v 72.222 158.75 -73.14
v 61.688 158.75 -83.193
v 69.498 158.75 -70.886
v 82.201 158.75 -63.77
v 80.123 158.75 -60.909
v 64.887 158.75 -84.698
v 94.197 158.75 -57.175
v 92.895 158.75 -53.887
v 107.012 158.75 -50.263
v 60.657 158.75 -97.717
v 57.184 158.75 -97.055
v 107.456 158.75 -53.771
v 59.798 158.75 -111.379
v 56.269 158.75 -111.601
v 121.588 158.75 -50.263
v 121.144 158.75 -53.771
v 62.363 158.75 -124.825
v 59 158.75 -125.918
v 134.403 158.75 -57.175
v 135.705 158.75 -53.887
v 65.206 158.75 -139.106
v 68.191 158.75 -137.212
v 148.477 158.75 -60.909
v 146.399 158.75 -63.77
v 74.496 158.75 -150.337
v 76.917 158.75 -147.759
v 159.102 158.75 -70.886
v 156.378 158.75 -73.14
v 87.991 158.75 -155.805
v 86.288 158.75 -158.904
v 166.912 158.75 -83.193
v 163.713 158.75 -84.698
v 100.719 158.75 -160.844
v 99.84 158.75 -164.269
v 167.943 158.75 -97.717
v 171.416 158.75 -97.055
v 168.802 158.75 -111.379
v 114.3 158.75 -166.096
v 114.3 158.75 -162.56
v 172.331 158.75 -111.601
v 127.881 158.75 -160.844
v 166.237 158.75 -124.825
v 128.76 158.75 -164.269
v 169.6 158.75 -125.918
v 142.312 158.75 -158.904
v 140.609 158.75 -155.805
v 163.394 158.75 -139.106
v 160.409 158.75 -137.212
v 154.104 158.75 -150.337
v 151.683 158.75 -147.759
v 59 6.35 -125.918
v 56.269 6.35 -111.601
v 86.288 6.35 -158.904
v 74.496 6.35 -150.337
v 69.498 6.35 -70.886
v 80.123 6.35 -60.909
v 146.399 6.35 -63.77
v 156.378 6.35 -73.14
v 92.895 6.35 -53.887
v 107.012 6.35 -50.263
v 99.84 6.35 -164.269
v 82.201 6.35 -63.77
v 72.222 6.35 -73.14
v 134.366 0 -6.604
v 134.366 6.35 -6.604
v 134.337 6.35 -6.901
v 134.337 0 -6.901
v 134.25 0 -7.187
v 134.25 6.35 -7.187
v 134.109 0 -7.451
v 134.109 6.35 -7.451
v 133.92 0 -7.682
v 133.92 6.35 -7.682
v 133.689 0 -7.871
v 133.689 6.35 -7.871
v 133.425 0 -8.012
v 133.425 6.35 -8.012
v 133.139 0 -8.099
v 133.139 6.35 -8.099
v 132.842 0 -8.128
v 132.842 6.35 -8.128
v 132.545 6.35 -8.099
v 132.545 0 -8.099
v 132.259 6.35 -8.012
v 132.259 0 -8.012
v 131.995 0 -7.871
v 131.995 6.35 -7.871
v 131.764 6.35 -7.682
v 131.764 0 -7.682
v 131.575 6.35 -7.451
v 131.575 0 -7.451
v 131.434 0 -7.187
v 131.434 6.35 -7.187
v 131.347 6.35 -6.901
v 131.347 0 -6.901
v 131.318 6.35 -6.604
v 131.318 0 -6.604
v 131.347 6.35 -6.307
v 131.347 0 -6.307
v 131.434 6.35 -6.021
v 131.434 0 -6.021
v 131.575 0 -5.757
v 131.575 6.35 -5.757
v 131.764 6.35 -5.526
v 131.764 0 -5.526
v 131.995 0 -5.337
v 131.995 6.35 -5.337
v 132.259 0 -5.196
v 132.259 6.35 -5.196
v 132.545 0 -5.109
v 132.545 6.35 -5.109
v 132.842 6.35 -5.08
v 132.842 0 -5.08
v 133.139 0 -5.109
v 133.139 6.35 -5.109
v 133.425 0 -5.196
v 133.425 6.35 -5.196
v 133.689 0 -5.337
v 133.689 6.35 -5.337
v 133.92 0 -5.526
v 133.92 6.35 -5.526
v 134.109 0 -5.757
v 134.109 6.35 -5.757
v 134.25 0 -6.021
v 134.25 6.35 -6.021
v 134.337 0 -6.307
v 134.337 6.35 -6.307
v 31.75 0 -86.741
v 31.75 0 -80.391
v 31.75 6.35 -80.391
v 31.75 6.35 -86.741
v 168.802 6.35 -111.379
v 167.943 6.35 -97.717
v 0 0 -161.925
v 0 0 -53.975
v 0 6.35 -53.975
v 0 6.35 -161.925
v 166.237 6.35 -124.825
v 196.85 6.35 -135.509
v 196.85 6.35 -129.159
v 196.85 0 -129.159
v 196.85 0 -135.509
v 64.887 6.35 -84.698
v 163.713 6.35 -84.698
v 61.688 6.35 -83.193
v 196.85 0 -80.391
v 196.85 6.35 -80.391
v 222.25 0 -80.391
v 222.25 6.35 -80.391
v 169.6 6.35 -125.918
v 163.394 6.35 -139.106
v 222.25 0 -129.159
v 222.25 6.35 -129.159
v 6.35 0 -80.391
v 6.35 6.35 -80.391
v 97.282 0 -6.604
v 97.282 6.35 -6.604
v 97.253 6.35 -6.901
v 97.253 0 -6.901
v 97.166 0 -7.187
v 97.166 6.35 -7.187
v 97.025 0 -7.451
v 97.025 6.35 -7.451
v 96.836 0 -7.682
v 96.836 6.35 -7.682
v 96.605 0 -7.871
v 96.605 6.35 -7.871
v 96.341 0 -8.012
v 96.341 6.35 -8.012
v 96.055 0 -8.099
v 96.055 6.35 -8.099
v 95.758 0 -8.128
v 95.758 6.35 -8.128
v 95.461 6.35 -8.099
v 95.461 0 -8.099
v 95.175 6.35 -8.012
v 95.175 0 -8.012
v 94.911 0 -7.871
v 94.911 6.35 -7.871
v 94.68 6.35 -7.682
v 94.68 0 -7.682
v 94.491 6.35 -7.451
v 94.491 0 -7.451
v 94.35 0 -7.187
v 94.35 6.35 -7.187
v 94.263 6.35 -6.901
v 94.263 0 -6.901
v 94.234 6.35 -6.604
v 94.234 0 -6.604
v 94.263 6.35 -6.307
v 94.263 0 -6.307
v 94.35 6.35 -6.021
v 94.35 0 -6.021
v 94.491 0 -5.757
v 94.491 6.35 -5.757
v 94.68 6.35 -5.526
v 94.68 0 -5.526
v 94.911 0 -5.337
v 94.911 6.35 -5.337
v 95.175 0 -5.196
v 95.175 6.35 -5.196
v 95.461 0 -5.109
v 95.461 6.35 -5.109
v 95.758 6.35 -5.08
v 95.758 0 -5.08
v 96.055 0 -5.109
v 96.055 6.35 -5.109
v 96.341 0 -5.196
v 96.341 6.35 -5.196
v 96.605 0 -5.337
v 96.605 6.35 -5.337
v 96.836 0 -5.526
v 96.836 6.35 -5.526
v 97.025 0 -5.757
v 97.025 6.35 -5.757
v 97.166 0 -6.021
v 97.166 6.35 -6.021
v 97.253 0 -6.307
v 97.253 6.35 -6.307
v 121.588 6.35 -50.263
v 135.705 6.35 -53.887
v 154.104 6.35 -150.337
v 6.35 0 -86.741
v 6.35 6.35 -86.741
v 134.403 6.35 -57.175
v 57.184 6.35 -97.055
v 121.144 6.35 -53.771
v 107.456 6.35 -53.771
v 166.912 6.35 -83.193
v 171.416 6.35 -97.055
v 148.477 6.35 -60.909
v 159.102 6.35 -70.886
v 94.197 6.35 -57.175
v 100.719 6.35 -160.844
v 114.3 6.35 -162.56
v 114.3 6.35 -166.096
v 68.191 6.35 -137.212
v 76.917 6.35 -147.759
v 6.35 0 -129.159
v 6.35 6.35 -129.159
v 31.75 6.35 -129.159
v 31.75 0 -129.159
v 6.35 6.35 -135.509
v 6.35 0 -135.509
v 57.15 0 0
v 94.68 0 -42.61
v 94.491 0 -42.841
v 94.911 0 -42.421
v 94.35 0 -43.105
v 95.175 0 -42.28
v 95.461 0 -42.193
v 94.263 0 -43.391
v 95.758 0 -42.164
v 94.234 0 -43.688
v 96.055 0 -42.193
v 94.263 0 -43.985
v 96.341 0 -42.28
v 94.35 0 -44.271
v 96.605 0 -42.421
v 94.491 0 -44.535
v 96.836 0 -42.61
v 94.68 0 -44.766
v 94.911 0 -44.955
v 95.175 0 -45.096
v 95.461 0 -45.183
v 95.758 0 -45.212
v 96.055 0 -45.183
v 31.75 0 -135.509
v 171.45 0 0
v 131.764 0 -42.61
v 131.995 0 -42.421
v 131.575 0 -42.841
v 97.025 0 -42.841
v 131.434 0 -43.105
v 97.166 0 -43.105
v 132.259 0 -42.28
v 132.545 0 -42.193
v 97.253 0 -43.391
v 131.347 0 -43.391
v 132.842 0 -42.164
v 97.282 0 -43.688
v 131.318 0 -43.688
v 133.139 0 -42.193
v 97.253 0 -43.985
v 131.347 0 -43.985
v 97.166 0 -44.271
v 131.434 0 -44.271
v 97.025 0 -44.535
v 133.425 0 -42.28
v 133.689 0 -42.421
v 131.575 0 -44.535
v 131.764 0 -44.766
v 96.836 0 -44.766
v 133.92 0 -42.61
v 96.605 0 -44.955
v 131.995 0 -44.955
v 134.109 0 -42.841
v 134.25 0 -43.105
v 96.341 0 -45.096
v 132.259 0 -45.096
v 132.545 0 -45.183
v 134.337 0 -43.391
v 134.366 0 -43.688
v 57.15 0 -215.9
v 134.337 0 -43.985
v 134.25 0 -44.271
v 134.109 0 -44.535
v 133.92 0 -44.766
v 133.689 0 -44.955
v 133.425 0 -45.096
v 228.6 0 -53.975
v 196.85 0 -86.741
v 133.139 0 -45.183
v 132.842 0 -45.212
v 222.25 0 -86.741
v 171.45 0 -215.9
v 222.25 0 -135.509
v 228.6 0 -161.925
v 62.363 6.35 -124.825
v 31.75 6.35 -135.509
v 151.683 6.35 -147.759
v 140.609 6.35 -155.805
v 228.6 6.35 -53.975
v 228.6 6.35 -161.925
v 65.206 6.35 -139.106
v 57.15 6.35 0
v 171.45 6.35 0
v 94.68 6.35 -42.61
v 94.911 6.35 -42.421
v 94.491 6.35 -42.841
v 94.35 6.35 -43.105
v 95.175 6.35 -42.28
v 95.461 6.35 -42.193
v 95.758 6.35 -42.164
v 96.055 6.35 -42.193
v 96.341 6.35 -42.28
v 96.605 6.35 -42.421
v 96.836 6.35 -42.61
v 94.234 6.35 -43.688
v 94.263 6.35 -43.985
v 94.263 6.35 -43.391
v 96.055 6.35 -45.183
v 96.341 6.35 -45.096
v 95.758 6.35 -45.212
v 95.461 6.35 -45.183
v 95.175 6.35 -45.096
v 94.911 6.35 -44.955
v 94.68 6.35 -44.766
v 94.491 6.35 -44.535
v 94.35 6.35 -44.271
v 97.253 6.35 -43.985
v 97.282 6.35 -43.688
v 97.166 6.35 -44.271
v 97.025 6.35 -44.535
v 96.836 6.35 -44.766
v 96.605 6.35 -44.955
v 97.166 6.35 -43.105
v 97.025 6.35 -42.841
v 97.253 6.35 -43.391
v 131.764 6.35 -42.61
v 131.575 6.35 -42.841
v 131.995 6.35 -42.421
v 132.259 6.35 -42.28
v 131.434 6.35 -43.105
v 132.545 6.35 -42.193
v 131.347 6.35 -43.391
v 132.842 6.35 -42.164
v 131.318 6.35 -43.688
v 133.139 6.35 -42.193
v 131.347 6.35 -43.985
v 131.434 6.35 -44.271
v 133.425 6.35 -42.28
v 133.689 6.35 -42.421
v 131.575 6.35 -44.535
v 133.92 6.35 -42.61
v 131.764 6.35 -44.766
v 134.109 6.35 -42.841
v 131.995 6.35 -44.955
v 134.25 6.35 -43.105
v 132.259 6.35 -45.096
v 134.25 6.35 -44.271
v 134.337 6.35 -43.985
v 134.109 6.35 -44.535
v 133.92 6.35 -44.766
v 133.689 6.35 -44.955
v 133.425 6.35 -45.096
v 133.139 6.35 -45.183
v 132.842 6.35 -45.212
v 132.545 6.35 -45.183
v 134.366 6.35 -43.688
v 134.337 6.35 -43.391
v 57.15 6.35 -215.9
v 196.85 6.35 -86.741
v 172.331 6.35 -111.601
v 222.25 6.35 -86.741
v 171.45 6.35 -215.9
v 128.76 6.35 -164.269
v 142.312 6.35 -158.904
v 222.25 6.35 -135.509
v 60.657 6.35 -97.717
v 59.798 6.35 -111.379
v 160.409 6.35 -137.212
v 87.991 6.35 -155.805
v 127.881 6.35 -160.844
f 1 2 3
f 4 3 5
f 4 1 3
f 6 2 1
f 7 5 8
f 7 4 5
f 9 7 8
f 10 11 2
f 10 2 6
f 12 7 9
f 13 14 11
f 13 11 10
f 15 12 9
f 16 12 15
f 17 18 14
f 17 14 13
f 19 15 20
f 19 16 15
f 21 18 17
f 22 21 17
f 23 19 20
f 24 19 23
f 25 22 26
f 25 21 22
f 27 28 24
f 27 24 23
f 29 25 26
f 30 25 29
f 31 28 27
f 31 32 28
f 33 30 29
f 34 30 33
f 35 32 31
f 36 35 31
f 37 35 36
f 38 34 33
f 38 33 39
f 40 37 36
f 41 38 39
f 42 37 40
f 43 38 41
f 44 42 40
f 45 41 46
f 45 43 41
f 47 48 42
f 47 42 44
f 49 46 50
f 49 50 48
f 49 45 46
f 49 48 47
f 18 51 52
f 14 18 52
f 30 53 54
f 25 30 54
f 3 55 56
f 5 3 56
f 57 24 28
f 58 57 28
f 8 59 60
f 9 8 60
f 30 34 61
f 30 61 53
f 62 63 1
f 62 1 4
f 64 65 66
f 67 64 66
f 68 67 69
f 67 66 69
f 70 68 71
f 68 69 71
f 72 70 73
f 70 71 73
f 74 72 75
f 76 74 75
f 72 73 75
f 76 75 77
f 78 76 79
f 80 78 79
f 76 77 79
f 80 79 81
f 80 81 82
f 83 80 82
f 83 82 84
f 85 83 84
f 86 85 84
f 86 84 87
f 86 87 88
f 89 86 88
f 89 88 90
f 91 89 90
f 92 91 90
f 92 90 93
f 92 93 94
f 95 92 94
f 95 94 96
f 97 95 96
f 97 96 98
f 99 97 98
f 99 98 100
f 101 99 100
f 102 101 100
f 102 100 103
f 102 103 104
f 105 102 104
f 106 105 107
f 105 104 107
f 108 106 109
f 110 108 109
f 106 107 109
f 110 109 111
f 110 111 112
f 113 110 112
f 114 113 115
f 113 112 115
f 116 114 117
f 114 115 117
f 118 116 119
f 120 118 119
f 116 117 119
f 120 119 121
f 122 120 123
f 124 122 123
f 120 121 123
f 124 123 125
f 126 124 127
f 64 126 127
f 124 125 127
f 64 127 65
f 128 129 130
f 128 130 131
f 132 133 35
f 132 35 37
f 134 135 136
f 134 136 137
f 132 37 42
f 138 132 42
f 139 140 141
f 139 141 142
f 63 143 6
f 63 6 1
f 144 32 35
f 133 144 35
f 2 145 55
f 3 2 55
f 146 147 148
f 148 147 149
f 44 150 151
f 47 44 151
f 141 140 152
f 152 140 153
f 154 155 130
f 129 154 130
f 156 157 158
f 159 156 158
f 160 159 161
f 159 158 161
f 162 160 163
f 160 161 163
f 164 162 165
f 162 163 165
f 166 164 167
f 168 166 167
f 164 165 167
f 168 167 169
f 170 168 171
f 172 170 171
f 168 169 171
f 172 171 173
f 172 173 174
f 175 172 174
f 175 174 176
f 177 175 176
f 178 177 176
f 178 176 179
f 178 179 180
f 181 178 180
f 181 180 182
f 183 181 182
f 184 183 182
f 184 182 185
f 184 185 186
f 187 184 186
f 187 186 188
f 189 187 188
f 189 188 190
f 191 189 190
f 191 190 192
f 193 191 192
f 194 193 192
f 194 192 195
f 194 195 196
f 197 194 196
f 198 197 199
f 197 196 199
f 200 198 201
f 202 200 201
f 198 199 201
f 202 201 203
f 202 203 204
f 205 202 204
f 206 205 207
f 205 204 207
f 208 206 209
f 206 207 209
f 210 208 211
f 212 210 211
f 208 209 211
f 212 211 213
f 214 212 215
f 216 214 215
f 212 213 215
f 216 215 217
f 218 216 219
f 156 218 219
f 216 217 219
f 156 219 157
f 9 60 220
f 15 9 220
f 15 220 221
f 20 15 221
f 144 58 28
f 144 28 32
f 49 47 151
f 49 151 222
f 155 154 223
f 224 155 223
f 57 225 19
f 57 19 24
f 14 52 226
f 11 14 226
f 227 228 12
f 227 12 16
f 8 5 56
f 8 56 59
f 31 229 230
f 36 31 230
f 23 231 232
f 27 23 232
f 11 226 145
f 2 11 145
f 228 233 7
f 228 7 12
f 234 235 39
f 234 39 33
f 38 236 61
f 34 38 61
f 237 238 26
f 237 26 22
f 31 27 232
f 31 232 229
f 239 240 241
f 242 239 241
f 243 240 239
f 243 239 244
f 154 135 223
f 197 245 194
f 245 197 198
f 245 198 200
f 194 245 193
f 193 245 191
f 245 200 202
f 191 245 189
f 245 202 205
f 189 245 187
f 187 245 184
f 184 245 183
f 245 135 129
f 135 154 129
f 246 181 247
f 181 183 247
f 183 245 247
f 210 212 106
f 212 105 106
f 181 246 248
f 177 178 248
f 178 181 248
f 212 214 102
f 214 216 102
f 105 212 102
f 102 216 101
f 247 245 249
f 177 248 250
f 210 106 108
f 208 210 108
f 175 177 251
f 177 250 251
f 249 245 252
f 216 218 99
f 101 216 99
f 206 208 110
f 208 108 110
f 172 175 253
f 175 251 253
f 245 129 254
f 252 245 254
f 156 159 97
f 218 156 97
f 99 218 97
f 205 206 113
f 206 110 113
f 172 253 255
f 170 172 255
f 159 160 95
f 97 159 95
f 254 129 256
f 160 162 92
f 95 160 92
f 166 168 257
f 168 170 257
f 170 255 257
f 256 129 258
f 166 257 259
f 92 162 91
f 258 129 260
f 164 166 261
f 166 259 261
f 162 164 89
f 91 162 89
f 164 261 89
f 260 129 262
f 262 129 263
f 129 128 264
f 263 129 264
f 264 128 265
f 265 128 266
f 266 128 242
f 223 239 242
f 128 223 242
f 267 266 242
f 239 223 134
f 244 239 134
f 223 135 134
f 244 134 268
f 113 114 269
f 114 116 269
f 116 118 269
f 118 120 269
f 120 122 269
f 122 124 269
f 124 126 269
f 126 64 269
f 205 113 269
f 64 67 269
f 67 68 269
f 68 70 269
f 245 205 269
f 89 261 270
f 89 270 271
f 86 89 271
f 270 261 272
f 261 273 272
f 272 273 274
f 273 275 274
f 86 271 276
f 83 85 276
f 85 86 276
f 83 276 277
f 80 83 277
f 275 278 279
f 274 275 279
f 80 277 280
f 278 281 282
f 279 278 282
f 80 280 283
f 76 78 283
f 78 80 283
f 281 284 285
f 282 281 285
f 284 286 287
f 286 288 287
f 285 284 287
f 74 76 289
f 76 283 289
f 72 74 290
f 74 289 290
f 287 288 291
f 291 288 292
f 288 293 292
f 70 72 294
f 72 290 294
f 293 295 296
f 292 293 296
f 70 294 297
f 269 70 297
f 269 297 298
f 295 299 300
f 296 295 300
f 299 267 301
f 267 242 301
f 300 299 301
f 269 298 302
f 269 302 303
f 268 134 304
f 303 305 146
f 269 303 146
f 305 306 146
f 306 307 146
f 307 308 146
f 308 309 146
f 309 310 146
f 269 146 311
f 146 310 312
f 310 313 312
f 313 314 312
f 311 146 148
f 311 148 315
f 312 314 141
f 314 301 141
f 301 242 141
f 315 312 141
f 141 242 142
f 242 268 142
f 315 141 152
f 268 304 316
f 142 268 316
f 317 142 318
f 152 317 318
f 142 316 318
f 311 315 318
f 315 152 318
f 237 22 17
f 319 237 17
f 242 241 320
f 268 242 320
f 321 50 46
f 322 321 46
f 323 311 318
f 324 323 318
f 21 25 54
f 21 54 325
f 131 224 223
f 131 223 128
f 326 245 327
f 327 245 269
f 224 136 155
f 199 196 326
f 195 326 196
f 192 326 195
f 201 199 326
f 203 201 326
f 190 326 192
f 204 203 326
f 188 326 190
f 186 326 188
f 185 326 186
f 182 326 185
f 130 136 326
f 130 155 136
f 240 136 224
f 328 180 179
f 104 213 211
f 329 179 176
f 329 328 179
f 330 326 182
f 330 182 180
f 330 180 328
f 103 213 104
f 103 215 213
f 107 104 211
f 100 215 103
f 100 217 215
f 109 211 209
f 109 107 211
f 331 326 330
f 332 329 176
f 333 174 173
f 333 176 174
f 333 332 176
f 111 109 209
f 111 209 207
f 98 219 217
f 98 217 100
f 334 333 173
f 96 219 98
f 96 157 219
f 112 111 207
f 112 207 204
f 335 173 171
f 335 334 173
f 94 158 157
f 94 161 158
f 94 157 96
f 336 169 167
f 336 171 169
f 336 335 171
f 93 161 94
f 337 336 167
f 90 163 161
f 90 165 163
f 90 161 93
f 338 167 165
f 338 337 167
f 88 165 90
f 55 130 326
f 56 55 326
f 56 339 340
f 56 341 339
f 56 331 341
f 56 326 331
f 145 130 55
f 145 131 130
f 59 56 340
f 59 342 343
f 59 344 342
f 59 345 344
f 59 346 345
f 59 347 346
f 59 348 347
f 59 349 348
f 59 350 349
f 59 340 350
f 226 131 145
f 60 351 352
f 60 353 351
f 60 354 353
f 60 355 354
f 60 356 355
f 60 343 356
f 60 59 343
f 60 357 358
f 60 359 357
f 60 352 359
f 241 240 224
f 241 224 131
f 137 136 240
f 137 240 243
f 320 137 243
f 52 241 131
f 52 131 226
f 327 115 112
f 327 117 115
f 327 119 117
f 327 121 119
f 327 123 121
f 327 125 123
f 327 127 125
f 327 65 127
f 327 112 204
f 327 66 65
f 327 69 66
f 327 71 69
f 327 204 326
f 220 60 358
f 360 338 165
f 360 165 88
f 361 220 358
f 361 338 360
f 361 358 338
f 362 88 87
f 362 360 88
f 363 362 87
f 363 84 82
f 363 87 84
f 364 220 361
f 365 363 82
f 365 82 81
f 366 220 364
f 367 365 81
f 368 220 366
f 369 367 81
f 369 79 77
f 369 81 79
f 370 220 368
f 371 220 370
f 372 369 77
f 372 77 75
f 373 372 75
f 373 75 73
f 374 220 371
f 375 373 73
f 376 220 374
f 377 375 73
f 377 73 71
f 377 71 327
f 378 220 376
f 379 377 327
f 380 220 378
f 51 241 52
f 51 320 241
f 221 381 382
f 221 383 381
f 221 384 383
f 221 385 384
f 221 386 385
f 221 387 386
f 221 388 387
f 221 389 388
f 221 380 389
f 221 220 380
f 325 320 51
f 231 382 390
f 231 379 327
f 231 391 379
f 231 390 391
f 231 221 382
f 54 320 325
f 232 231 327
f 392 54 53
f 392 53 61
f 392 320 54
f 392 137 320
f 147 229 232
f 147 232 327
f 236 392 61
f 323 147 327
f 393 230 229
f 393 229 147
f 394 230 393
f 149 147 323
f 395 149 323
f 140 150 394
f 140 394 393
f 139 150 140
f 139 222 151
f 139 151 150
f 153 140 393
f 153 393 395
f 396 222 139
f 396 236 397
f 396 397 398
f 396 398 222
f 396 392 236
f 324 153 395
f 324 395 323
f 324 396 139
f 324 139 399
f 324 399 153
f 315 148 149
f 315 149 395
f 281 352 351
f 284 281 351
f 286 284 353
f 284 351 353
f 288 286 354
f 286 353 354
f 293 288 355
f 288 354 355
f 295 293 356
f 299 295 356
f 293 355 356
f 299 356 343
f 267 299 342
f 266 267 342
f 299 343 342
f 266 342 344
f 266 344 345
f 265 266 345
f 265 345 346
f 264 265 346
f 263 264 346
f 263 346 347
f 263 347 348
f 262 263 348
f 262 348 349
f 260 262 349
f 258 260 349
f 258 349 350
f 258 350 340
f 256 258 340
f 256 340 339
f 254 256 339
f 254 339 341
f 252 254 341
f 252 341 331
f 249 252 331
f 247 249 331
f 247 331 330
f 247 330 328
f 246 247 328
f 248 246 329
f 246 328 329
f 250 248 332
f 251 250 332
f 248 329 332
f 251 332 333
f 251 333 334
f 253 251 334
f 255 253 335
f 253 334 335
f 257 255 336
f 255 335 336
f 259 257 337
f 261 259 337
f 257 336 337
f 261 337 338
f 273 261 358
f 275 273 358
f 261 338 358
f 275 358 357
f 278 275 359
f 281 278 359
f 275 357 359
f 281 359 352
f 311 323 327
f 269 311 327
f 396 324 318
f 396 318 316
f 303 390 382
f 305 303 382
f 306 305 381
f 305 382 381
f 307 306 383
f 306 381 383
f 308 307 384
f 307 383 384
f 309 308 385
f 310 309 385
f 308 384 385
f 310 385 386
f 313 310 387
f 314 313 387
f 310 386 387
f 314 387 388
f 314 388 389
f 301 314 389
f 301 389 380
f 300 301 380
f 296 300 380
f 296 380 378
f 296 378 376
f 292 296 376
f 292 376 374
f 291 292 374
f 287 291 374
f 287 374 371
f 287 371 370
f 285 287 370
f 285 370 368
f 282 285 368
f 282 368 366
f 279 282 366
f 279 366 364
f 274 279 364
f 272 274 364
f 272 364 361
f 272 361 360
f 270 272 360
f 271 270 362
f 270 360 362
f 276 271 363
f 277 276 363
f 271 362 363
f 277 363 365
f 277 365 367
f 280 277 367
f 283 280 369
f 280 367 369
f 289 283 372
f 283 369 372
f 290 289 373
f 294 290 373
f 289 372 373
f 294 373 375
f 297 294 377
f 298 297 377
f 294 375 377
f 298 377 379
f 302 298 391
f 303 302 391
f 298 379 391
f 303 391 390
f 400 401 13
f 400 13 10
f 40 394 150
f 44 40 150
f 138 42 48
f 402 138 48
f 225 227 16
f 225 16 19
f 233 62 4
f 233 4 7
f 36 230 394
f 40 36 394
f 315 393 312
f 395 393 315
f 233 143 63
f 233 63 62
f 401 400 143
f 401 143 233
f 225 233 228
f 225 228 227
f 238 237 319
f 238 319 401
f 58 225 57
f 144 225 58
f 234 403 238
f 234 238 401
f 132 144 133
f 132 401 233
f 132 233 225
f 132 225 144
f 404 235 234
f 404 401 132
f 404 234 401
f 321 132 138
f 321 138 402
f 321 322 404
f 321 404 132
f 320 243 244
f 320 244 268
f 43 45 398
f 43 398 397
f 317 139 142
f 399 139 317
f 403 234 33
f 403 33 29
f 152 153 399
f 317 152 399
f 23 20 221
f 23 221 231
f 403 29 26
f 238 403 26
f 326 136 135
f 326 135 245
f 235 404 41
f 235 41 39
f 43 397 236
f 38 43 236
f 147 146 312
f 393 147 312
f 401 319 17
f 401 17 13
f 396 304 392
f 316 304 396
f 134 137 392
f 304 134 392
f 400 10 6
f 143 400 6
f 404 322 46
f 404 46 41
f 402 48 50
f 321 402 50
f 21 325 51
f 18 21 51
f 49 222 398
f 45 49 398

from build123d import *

# Parameters (mm, degrees)
SKETCH1_W           = 228.6
SKETCH1_H           = 215.9
BOSS_EXTRUDE1_DEPTH = 6.35
SKETCH8_W           = 25.4
SKETCH8_H           = 6.35
CUT_EXTRUDE2_DEPTH  = 7.35
SKETCH11_R          = 1.524
CUT_EXTRUDE4_DEPTH  = 7.35
CUT_EXTRUDE5_DEPTH  = 7.35
BOSS_EXTRUDE3_DEPTH = 152.4


with BuildPart() as part:
    # Sketch1 → Boss-Extrude1 (new body)
    with BuildSketch(Plane(origin=(0, 0, 0), x_dir=(1, 0, 0), z_dir=(0, 1, 0))):
        with Locations((114.3, 107.95)):
            Rectangle(SKETCH1_W, SKETCH1_H)
    extrude(amount=BOSS_EXTRUDE1_DEPTH)

    # Sketch8 → Cut-Extrude2 (cut, through all)
    with BuildSketch(Plane(origin=(0, 6.35, 0), x_dir=(1, 0, 0), z_dir=(0, 1, 0))):
        with Locations((19.05, 132.334)):
            Rectangle(SKETCH8_W, SKETCH8_H)
        with Locations((209.55, 132.334)):
            Rectangle(SKETCH8_W, SKETCH8_H)
        with Locations((209.55, 83.566)):
            Rectangle(SKETCH8_W, SKETCH8_H)
        with Locations((19.05, 83.566)):
            Rectangle(SKETCH8_W, SKETCH8_H)
    extrude(amount=-CUT_EXTRUDE2_DEPTH, mode=Mode.SUBTRACT)

    # Sketch11 → Cut-Extrude4 (cut, through all)
    with BuildSketch(Plane(origin=(0, 6.35, 0), x_dir=(1, 0, 0), z_dir=(0, 1, 0))):
        with Locations((95.758, 6.604)):
            Circle(SKETCH11_R)
        with Locations((132.842, 6.604)):
            Circle(SKETCH11_R)
        with Locations((132.842, 43.688)):
            Circle(SKETCH11_R)
        with Locations((95.758, 43.688)):
            Circle(SKETCH11_R)
    extrude(amount=-CUT_EXTRUDE4_DEPTH, mode=Mode.SUBTRACT)

    # Sketch13 → Cut-Extrude5 (cut, through all)
    with BuildSketch(Plane(origin=(0, 6.35, 0), x_dir=(1, 0, 0), z_dir=(0, 1, 0))):
        Polygon((0, 215.9), (0, 161.925), (57.15, 215.9), align=None)
        Polygon((228.6, 161.925), (171.45, 215.9), (228.6, 215.9), align=None)
        Polygon((228.6, 0), (228.6, 53.975), (171.45, 0), align=None)
        Polygon((0, 53.975), (57.15, 0), (0, 0), align=None)
    extrude(amount=-CUT_EXTRUDE5_DEPTH, mode=Mode.SUBTRACT)

    # Sketch18 → Boss-Extrude3 (add)
    with BuildSketch(Plane(origin=(0, 6.35, 0), x_dir=(1, 0, 0), z_dir=(0, 1, 0))):
        Polygon((114.3, 166.095906935), (99.839700965, 164.269146346), (86.2879957, 158.903646664), (74.496387686, 150.336541968), (65.205787021, 139.106134954), (58.999956314, 125.918073396), (56.26883073, 111.601011705), (57.184016936, 97.054543521), (61.688010415, 83.192676938), (69.497808694, 70.886404014), (80.122693423, 60.908973136), (92.895064019, 53.887302981), (107.012385465, 50.262590909), (121.587614535, 50.262590909), (135.704935981, 53.887302981), (148.477306577, 60.908973136), (159.102191306, 70.886404014), (166.911989585, 83.192676938), (171.415983064, 97.054543521), (172.33116927, 111.601011705), (169.600043686, 125.918073396), (163.394212979, 139.106134954), (154.103612314, 150.336541968), (142.3120043, 158.903646664), (128.760299035, 164.269146346), align=None)
        Polygon((114.3, 162.56), (100.719045262, 160.844326429), (87.991431857, 155.805107797), (76.916882545, 147.758976743), (68.191251988, 137.211501274), (62.362803645, 124.825418063), (59.797760361, 111.378990271), (60.657293238, 97.71710641), (64.887394665, 84.698192888), (72.222271812, 73.14027592), (82.201047372, 63.769581937), (94.196718178, 57.174906106), (107.455552115, 53.770616161), (121.144447885, 53.770616161), (134.403281822, 57.174906106), (146.398952628, 63.769581937), (156.377728188, 73.14027592), (163.712605335, 84.698192888), (167.942706762, 97.71710641), (168.802239639, 111.378990271), (166.237196355, 124.825418063), (160.408748012, 137.211501274), (151.683117455, 147.758976743), (140.608568143, 155.805107797), (127.880954738, 160.844326429), align=None, mode=Mode.SUBTRACT)
    extrude(amount=BOSS_EXTRUDE3_DEPTH)


solid = part.part
